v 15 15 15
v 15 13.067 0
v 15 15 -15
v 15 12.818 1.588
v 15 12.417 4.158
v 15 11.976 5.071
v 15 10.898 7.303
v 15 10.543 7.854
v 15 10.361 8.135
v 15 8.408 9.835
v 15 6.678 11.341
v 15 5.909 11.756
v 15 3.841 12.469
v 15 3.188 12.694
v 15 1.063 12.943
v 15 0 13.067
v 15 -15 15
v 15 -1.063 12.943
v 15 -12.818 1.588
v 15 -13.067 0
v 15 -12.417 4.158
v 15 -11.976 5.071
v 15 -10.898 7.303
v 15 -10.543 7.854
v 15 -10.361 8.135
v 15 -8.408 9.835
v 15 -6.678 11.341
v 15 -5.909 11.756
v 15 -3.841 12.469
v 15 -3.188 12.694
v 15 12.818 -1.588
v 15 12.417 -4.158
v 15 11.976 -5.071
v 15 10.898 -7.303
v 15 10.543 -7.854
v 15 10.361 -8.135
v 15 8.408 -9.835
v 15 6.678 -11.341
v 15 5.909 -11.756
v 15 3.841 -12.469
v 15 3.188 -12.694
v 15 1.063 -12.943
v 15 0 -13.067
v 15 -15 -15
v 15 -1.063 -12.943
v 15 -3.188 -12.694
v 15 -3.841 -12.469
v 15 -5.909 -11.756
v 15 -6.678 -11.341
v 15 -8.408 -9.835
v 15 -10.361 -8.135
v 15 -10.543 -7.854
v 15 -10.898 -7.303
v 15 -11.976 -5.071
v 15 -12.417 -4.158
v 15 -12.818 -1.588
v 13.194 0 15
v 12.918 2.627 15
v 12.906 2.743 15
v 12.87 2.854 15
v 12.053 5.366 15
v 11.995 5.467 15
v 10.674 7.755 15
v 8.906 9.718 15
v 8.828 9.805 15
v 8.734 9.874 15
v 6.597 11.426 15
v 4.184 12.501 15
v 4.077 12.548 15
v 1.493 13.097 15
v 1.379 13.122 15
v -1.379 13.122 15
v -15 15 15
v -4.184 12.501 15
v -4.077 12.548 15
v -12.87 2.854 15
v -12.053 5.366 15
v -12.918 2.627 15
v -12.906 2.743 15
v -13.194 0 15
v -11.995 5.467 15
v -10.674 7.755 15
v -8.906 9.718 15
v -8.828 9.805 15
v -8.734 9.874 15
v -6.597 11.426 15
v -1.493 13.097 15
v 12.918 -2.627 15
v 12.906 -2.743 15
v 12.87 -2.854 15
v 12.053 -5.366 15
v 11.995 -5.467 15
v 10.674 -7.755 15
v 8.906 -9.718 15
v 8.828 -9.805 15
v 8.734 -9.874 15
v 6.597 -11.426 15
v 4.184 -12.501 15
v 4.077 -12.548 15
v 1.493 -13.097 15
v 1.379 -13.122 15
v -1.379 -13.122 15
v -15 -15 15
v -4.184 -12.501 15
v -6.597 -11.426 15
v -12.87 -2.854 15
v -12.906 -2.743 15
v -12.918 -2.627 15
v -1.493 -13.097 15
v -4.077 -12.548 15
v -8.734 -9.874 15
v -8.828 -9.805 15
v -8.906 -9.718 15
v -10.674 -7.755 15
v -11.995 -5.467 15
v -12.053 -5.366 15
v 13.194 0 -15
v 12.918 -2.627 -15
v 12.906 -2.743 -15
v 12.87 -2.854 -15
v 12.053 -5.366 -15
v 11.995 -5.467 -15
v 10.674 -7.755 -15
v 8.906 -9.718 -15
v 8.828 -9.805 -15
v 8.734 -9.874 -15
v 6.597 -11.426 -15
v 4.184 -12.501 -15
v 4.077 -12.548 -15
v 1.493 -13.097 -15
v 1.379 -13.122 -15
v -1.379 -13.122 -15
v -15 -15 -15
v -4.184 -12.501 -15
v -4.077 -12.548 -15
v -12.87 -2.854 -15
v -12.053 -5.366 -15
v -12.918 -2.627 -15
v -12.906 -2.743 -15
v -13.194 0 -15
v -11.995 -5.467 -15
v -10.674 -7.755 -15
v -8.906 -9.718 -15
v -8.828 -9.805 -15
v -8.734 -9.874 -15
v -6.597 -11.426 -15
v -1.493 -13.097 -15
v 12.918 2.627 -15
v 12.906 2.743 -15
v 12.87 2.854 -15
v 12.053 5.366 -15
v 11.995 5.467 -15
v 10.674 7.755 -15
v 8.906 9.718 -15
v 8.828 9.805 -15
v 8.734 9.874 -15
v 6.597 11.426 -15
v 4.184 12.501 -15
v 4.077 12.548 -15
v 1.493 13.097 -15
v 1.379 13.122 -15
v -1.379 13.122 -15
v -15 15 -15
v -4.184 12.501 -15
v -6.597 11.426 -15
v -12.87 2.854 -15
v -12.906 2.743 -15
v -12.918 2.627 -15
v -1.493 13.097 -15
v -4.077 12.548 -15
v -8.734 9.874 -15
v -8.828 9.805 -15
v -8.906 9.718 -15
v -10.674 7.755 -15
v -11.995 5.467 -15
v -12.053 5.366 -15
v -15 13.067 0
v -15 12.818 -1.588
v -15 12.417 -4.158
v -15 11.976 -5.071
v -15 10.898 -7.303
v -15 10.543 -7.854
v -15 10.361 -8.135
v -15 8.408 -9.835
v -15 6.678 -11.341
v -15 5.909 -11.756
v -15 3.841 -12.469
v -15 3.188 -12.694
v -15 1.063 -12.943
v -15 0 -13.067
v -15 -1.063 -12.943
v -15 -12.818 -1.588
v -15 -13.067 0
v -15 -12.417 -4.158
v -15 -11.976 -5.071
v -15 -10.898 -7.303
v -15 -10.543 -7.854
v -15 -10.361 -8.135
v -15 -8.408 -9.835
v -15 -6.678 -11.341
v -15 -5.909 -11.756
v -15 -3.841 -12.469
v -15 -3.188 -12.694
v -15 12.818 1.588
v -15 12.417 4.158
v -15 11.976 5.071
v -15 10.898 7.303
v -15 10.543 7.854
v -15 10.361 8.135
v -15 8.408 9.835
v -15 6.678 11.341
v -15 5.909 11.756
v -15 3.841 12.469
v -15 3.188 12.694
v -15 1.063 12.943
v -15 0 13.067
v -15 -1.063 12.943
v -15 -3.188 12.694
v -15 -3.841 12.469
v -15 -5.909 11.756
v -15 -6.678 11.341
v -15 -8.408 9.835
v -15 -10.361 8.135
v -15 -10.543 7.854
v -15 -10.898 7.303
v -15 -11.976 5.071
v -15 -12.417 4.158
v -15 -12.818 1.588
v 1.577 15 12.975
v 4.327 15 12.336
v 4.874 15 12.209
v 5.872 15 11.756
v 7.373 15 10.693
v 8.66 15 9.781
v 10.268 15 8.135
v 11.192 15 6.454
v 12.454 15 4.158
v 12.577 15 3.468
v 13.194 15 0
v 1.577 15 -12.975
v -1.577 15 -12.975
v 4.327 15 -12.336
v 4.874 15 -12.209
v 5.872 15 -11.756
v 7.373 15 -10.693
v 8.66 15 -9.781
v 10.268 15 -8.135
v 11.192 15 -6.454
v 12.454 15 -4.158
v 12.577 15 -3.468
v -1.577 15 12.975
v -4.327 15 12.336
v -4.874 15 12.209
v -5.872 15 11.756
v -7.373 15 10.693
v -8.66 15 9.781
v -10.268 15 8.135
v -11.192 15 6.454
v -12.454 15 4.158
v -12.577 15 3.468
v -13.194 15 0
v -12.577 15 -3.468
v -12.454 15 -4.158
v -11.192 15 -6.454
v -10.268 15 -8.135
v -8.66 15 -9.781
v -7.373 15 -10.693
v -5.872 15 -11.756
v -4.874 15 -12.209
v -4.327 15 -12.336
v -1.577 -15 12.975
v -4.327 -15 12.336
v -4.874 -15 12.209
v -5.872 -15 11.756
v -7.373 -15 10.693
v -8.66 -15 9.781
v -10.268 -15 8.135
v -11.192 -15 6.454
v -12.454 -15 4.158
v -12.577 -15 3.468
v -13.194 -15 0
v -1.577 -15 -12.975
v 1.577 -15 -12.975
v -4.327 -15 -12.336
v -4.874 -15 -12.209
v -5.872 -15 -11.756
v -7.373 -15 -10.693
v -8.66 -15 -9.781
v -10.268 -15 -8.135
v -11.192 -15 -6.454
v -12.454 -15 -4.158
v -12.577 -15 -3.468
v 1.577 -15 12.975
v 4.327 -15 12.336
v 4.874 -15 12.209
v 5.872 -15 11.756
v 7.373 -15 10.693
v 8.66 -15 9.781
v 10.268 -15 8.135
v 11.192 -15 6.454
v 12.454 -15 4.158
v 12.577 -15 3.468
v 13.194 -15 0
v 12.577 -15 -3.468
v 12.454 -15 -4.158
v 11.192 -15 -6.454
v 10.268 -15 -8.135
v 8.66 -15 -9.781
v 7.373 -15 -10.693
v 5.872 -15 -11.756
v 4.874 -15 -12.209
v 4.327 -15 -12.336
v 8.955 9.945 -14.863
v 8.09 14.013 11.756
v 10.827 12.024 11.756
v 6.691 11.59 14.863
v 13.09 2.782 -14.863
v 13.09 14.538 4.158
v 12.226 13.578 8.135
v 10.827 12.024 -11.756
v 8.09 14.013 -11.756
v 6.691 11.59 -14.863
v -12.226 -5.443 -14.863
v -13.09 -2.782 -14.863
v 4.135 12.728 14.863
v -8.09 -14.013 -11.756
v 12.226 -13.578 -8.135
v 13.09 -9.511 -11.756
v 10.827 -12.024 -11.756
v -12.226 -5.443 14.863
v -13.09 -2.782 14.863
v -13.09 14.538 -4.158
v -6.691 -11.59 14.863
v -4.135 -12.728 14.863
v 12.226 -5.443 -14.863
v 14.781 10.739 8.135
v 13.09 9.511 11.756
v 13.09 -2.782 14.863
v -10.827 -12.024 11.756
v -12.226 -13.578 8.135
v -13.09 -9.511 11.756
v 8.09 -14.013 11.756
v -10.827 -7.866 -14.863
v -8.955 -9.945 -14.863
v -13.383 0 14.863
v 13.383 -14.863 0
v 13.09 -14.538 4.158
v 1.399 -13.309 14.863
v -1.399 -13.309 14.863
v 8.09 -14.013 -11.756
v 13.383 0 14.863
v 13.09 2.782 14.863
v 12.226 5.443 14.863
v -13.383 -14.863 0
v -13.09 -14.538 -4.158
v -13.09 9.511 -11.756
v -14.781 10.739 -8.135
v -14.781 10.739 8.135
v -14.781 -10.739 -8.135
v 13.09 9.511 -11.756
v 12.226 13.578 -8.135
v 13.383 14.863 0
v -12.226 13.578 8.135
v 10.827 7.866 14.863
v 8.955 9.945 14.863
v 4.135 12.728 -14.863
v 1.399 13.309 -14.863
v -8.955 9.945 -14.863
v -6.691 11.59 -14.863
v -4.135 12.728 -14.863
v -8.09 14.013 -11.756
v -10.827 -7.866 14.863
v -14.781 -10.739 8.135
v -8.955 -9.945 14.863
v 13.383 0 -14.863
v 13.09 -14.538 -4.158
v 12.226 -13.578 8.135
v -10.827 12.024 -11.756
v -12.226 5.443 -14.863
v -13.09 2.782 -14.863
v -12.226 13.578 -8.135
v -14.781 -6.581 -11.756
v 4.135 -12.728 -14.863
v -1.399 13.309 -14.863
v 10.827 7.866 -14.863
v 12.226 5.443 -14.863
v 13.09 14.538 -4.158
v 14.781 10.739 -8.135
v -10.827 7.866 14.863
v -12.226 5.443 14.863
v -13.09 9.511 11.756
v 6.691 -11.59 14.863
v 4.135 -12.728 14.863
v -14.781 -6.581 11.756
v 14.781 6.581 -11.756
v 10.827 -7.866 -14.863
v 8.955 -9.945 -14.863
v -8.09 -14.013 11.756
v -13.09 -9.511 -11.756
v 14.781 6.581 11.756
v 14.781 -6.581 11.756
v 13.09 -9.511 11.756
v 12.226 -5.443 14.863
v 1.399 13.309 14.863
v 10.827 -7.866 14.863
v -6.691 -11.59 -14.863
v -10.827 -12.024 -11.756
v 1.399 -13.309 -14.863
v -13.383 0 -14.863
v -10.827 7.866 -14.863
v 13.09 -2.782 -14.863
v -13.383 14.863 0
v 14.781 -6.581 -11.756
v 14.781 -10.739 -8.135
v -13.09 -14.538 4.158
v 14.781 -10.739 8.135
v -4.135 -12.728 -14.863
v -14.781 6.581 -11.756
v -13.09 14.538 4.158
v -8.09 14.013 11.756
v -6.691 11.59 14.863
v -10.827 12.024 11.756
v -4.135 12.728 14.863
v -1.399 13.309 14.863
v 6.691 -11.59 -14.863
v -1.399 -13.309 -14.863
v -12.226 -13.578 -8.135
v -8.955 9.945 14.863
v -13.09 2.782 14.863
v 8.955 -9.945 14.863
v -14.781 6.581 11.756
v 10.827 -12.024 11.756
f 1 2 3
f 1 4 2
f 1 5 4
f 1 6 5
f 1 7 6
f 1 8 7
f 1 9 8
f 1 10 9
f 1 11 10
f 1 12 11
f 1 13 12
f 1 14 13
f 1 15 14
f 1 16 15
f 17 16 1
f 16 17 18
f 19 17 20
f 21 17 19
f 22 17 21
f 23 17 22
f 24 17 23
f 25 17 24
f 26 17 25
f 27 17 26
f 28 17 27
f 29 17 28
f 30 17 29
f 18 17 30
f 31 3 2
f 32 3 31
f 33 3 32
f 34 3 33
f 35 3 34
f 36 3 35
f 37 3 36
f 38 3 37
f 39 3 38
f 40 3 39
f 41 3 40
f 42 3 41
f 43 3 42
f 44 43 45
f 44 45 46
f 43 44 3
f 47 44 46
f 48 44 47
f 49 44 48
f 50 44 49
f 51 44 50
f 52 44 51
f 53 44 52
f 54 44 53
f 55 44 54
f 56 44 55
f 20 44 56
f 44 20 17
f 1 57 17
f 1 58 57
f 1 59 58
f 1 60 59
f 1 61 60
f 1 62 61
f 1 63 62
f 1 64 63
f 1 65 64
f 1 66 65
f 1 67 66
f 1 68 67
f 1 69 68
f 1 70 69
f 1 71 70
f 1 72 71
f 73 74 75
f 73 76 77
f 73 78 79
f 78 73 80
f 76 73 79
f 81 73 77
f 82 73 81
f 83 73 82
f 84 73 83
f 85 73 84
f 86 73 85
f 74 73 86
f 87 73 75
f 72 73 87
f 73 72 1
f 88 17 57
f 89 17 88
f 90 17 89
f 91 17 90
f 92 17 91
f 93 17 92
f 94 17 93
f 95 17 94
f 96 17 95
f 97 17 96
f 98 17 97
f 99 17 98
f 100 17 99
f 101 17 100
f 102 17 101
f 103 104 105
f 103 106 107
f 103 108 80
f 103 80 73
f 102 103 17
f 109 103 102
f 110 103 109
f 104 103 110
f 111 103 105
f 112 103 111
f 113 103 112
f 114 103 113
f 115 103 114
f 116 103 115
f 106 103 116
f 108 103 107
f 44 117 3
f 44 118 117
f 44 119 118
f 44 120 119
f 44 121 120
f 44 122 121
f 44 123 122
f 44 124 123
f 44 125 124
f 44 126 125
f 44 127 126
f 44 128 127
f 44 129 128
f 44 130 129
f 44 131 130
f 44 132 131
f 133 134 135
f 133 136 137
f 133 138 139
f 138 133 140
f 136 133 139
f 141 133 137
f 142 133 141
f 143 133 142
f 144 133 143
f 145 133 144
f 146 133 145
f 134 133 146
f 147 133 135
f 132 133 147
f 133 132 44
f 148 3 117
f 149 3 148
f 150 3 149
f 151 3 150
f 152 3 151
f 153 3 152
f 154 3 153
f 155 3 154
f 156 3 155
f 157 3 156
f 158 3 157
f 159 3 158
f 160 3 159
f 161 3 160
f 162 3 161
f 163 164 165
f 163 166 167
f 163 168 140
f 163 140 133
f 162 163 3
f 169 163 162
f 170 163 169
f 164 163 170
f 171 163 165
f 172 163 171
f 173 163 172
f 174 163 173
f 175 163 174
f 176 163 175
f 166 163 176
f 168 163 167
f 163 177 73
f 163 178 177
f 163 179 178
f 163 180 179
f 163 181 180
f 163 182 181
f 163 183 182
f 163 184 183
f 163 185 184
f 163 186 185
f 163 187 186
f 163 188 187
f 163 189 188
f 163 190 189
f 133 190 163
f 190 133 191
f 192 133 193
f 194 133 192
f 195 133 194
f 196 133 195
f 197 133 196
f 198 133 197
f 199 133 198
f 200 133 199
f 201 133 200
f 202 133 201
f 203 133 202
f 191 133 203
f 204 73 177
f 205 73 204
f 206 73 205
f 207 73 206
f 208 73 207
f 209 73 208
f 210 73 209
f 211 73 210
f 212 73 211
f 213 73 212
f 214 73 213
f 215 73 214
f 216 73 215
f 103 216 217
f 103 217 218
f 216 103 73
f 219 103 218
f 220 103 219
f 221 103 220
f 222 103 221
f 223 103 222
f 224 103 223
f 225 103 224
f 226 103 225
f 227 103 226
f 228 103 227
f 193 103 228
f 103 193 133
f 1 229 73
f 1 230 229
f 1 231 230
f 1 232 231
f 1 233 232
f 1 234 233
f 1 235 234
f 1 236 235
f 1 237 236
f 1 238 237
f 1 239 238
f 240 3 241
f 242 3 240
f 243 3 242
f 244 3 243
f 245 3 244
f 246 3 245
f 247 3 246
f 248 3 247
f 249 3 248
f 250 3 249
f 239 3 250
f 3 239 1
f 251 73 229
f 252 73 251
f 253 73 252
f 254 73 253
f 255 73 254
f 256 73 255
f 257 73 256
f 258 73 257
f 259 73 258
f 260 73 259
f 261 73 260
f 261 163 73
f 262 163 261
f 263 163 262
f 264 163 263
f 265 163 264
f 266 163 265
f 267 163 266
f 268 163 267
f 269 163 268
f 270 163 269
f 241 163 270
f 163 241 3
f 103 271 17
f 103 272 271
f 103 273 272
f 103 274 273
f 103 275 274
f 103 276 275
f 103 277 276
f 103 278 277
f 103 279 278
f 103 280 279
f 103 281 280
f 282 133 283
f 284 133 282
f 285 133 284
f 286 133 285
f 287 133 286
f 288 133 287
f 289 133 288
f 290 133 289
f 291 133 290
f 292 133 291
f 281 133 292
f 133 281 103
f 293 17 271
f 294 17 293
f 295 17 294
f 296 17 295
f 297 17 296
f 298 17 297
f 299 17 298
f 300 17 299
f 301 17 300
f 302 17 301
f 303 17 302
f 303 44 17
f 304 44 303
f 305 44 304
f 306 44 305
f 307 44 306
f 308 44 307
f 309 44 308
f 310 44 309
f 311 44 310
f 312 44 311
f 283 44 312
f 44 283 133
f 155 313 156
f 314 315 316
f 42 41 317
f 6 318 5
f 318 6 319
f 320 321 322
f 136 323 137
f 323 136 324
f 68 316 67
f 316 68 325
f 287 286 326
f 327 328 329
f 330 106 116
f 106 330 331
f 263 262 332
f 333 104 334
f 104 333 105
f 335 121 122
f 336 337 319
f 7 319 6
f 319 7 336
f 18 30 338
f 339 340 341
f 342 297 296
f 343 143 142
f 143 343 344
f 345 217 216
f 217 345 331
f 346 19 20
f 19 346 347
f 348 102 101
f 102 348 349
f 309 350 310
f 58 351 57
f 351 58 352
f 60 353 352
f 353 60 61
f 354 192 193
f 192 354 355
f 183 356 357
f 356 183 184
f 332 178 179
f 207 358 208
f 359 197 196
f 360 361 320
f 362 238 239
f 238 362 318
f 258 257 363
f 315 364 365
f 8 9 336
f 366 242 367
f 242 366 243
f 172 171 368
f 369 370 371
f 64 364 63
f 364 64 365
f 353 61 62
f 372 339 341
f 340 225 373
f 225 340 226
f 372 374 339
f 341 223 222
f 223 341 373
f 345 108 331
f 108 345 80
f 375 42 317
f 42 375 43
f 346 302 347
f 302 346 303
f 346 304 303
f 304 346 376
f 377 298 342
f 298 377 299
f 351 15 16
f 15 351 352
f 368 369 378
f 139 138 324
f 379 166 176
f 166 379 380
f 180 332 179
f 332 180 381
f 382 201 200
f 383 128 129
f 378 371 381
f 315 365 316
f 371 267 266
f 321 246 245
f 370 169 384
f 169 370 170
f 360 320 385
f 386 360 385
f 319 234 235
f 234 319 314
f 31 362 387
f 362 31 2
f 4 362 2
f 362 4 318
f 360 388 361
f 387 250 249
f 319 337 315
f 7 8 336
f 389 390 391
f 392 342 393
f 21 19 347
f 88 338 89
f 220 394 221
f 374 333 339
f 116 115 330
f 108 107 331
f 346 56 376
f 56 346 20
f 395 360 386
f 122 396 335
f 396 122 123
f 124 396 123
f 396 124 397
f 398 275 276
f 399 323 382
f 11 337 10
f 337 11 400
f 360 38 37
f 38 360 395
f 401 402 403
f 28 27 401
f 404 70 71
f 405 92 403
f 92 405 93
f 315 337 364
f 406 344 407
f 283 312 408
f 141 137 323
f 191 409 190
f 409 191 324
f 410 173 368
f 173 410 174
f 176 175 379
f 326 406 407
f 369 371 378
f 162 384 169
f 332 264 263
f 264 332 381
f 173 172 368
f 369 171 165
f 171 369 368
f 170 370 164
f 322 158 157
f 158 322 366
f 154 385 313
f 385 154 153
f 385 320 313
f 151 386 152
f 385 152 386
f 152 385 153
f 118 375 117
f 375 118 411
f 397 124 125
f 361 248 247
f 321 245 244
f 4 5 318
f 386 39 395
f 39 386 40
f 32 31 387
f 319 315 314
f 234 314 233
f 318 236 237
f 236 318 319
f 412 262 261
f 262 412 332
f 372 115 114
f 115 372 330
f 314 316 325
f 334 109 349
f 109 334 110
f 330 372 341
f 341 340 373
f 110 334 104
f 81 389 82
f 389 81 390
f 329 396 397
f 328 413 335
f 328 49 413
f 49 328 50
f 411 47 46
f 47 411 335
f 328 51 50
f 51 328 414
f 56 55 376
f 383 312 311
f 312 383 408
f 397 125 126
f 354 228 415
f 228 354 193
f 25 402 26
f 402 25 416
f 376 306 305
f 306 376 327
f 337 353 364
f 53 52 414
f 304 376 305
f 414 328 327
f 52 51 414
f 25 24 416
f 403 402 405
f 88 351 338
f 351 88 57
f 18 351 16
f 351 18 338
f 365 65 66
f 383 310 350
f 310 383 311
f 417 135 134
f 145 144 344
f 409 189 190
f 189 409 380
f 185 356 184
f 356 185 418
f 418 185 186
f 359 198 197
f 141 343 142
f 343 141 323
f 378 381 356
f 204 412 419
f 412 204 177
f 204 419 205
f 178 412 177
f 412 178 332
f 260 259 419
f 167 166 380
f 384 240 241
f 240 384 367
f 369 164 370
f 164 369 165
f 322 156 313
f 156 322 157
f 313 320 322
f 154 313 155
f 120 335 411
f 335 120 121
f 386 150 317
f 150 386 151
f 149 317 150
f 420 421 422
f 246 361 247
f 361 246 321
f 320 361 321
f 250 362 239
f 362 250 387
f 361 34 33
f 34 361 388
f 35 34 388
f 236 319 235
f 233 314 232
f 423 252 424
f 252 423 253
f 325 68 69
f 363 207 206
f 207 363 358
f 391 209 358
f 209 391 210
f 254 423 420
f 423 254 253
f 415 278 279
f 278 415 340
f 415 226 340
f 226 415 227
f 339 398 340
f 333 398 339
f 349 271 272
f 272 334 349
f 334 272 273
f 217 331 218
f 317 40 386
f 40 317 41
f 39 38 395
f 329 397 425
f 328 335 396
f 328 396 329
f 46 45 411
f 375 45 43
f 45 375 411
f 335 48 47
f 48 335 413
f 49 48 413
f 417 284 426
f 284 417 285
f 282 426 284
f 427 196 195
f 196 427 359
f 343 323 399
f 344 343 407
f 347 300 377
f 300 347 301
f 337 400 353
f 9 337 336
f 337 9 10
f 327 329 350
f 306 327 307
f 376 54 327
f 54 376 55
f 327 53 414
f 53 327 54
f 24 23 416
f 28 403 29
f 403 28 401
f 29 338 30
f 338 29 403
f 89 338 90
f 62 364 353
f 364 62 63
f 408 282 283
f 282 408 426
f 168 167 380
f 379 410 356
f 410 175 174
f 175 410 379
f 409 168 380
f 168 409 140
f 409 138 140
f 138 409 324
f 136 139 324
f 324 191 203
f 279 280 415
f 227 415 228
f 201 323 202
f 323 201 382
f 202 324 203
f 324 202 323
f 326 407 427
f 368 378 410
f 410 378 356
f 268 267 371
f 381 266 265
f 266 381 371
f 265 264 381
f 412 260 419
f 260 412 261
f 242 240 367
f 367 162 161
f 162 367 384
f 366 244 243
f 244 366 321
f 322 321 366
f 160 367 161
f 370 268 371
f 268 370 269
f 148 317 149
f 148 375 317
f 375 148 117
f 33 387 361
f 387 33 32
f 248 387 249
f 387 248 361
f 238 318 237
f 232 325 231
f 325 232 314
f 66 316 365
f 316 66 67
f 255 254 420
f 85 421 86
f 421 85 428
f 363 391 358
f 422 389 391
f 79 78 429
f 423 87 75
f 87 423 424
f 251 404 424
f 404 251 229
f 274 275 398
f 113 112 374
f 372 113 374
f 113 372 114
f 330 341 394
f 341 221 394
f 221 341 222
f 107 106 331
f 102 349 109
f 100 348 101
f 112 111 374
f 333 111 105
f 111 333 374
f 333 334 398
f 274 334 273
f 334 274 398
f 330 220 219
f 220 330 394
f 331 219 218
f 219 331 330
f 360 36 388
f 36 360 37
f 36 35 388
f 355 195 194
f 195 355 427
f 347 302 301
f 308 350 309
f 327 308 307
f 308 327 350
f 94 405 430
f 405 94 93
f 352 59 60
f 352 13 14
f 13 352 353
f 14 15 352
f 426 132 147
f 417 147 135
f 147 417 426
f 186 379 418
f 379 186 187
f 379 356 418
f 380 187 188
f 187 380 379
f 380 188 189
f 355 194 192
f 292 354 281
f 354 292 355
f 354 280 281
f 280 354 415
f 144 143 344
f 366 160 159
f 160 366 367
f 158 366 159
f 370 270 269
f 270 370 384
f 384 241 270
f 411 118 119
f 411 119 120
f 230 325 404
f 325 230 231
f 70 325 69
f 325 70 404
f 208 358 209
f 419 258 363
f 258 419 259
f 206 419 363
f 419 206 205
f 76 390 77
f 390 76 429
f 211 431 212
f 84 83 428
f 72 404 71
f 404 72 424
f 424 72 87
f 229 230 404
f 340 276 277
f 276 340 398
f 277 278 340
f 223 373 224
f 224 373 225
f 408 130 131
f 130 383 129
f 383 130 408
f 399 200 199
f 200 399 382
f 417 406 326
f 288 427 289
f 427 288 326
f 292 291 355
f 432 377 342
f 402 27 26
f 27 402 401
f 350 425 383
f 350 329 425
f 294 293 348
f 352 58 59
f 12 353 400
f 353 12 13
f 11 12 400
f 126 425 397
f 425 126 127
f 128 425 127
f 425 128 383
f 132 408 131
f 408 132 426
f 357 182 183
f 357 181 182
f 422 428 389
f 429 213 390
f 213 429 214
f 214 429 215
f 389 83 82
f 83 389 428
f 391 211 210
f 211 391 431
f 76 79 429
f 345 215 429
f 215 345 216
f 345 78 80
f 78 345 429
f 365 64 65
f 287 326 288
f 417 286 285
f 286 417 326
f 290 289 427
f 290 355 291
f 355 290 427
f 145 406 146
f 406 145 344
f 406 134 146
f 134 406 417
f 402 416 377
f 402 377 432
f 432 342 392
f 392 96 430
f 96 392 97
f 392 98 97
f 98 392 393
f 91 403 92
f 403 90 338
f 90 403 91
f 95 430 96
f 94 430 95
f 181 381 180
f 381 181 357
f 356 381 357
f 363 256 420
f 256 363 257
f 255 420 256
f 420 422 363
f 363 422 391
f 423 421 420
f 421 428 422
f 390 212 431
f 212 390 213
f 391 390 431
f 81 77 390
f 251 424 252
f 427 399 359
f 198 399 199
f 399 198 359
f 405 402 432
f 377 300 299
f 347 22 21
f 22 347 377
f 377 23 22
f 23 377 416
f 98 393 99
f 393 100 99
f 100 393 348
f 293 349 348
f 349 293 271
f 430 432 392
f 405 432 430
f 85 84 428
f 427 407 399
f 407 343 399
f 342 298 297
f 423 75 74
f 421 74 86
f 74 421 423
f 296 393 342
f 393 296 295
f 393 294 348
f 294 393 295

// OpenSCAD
// difference_cube.scad - Example for difference() usage in OpenSCAD

echo(version=version());

module difference_cube()
{
	difference() {
		cube(30, center = true);
		sphere(20);
	}
}

difference_cube();



// Written by Clifford Wolf &ltclifford@clifford.at> and Marius
// Kintel &ltmarius@kintel.net>
//
// To the extent possible under law, the author(s) have dedicated all
// copyright and related and neighboring rights to this software to the
// public domain worldwide. This software is distributed without any
// warranty.
//
// You should have received a copy of the CC0 Public Domain
// Dedication along with this software.
// If not, see &lthttp://creativecommons.org/publicdomain/zero/1.0/&gt.
